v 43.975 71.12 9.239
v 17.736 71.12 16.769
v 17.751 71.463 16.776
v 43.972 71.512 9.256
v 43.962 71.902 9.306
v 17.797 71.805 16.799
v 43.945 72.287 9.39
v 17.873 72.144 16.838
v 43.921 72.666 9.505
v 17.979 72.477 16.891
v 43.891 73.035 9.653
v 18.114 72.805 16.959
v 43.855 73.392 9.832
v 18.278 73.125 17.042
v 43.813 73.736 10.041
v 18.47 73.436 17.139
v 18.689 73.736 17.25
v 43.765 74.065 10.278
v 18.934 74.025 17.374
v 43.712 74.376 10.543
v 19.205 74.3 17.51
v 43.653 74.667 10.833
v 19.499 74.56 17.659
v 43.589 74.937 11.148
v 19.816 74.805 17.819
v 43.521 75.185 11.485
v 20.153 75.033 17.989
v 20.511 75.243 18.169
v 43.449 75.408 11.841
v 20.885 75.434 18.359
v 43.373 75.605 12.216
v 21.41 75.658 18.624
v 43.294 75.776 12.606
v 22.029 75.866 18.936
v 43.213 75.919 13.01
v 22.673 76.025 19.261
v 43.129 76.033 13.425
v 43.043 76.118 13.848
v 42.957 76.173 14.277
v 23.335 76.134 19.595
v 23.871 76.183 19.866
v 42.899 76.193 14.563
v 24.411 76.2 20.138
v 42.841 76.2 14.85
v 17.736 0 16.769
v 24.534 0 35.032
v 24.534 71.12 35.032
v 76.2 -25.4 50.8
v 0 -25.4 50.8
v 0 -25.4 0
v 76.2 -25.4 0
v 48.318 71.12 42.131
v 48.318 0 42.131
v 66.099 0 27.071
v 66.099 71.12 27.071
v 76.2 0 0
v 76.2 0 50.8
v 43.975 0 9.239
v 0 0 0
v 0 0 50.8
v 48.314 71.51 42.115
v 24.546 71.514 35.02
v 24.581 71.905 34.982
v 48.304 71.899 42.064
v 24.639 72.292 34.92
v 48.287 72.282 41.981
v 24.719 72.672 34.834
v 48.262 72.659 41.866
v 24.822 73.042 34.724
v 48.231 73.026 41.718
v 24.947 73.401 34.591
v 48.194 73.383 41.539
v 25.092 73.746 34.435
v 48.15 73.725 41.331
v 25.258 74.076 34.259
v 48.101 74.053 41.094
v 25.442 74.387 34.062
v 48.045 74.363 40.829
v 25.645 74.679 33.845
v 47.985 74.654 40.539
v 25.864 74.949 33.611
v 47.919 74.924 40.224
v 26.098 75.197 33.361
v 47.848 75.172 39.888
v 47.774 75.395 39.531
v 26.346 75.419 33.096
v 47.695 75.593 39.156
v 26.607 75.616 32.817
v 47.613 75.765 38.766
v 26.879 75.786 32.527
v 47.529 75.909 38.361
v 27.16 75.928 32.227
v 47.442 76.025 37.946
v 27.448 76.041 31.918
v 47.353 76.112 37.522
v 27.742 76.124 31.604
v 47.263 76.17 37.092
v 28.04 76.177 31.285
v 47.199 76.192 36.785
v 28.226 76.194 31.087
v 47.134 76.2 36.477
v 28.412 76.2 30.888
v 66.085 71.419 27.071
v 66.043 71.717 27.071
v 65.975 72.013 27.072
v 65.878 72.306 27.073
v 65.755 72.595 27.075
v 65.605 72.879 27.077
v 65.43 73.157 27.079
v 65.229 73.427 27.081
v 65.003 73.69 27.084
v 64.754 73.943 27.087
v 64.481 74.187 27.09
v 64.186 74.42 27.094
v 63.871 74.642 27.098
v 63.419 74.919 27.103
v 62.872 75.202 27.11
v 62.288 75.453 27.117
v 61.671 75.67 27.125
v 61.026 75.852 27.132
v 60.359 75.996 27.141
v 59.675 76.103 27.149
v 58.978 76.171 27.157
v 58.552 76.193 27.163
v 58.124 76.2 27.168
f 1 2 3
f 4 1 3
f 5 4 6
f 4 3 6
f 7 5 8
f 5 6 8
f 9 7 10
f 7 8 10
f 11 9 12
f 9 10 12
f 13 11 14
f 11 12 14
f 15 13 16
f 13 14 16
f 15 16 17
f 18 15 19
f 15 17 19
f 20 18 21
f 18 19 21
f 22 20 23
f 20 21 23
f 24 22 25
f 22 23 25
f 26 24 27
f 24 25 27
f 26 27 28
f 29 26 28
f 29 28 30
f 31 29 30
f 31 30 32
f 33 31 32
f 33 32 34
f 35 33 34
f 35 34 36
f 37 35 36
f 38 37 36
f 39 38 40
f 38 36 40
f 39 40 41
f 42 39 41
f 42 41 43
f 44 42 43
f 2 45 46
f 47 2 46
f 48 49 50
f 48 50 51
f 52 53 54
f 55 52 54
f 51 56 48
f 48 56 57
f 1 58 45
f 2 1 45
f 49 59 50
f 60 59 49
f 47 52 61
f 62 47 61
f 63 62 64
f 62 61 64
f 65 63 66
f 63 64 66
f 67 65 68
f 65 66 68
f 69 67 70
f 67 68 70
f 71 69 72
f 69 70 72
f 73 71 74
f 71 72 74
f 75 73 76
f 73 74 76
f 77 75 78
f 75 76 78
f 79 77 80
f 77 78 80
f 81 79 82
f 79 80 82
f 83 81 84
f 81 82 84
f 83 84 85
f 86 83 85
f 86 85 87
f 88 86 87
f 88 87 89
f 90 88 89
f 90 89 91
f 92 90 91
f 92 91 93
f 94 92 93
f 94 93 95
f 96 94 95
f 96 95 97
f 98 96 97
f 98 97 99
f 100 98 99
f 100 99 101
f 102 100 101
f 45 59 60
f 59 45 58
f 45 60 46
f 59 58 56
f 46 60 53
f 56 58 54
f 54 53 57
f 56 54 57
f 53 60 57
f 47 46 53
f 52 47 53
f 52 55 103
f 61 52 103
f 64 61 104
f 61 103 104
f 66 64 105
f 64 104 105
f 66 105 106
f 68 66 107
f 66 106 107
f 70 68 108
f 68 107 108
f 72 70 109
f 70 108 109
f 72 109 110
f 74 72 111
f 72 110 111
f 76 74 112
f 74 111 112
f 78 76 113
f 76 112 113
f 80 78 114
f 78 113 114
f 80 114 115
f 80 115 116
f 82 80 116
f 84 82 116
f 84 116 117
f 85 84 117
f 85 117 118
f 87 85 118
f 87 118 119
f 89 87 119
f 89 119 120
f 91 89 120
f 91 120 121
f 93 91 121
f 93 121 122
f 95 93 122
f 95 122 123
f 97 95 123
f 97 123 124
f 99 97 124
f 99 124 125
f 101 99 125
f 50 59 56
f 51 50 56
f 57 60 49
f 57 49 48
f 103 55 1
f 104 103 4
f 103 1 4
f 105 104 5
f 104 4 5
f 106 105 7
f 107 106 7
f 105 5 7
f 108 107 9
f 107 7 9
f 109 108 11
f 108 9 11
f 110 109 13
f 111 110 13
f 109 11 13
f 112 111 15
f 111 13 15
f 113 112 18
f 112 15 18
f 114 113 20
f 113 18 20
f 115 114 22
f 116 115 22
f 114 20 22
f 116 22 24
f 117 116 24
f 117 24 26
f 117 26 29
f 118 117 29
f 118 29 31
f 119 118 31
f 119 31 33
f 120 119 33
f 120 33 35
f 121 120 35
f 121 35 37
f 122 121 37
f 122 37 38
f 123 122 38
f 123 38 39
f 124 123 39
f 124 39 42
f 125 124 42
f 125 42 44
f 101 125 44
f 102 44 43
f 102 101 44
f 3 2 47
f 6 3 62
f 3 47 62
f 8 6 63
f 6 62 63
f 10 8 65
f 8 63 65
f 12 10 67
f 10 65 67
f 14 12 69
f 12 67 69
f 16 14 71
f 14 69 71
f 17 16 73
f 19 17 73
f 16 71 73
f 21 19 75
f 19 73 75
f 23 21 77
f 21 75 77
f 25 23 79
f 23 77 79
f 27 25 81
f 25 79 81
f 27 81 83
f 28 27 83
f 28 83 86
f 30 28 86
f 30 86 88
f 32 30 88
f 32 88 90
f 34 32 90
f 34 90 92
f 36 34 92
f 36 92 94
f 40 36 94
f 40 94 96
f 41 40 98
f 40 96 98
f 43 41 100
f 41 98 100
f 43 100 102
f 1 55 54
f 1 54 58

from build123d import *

# Parameters (mm, degrees)
F0_W     = 76.2
F0_H     = 50.8
F1_DEPTH = 25.4
F3_DEPTH = 76.2
F4_R     = 5.08


with BuildPart() as f1:
    # F0 (on Front) → F1 (new body)
    with BuildSketch(Plane.XZ):
        with Locations((38.1, 25.4)):
            Rectangle(F0_W, F0_H)
    extrude(amount=F1_DEPTH)

    # F2 (on face) → F3 (join)
    with BuildSketch(Plane(origin=(0, 0, 0), x_dir=(-1, 0, 0), z_dir=(0, 1, 0))):
        Polygon((-43.975126, 9.23935), (-17.735837, 16.768539), (-24.533954, 35.03225), (-48.317943, 42.131286), (-66.098824, 27.070532), align=None)
    extrude(amount=F3_DEPTH)

    # F4
    f4_edges = [f1.edges().sort_by_distance(p)[0] for p in [
        (55.036975, 76.2, 18.154941),
        (30.855482, 76.2, 13.003944),
        (21.134895, 76.2, 25.900395),
        (36.425948, 76.2, 38.581768),
        (57.208383, 76.2, 34.600909),
    ]]
    fillet(f4_edges, radius=F4_R)


solid = f1.part
